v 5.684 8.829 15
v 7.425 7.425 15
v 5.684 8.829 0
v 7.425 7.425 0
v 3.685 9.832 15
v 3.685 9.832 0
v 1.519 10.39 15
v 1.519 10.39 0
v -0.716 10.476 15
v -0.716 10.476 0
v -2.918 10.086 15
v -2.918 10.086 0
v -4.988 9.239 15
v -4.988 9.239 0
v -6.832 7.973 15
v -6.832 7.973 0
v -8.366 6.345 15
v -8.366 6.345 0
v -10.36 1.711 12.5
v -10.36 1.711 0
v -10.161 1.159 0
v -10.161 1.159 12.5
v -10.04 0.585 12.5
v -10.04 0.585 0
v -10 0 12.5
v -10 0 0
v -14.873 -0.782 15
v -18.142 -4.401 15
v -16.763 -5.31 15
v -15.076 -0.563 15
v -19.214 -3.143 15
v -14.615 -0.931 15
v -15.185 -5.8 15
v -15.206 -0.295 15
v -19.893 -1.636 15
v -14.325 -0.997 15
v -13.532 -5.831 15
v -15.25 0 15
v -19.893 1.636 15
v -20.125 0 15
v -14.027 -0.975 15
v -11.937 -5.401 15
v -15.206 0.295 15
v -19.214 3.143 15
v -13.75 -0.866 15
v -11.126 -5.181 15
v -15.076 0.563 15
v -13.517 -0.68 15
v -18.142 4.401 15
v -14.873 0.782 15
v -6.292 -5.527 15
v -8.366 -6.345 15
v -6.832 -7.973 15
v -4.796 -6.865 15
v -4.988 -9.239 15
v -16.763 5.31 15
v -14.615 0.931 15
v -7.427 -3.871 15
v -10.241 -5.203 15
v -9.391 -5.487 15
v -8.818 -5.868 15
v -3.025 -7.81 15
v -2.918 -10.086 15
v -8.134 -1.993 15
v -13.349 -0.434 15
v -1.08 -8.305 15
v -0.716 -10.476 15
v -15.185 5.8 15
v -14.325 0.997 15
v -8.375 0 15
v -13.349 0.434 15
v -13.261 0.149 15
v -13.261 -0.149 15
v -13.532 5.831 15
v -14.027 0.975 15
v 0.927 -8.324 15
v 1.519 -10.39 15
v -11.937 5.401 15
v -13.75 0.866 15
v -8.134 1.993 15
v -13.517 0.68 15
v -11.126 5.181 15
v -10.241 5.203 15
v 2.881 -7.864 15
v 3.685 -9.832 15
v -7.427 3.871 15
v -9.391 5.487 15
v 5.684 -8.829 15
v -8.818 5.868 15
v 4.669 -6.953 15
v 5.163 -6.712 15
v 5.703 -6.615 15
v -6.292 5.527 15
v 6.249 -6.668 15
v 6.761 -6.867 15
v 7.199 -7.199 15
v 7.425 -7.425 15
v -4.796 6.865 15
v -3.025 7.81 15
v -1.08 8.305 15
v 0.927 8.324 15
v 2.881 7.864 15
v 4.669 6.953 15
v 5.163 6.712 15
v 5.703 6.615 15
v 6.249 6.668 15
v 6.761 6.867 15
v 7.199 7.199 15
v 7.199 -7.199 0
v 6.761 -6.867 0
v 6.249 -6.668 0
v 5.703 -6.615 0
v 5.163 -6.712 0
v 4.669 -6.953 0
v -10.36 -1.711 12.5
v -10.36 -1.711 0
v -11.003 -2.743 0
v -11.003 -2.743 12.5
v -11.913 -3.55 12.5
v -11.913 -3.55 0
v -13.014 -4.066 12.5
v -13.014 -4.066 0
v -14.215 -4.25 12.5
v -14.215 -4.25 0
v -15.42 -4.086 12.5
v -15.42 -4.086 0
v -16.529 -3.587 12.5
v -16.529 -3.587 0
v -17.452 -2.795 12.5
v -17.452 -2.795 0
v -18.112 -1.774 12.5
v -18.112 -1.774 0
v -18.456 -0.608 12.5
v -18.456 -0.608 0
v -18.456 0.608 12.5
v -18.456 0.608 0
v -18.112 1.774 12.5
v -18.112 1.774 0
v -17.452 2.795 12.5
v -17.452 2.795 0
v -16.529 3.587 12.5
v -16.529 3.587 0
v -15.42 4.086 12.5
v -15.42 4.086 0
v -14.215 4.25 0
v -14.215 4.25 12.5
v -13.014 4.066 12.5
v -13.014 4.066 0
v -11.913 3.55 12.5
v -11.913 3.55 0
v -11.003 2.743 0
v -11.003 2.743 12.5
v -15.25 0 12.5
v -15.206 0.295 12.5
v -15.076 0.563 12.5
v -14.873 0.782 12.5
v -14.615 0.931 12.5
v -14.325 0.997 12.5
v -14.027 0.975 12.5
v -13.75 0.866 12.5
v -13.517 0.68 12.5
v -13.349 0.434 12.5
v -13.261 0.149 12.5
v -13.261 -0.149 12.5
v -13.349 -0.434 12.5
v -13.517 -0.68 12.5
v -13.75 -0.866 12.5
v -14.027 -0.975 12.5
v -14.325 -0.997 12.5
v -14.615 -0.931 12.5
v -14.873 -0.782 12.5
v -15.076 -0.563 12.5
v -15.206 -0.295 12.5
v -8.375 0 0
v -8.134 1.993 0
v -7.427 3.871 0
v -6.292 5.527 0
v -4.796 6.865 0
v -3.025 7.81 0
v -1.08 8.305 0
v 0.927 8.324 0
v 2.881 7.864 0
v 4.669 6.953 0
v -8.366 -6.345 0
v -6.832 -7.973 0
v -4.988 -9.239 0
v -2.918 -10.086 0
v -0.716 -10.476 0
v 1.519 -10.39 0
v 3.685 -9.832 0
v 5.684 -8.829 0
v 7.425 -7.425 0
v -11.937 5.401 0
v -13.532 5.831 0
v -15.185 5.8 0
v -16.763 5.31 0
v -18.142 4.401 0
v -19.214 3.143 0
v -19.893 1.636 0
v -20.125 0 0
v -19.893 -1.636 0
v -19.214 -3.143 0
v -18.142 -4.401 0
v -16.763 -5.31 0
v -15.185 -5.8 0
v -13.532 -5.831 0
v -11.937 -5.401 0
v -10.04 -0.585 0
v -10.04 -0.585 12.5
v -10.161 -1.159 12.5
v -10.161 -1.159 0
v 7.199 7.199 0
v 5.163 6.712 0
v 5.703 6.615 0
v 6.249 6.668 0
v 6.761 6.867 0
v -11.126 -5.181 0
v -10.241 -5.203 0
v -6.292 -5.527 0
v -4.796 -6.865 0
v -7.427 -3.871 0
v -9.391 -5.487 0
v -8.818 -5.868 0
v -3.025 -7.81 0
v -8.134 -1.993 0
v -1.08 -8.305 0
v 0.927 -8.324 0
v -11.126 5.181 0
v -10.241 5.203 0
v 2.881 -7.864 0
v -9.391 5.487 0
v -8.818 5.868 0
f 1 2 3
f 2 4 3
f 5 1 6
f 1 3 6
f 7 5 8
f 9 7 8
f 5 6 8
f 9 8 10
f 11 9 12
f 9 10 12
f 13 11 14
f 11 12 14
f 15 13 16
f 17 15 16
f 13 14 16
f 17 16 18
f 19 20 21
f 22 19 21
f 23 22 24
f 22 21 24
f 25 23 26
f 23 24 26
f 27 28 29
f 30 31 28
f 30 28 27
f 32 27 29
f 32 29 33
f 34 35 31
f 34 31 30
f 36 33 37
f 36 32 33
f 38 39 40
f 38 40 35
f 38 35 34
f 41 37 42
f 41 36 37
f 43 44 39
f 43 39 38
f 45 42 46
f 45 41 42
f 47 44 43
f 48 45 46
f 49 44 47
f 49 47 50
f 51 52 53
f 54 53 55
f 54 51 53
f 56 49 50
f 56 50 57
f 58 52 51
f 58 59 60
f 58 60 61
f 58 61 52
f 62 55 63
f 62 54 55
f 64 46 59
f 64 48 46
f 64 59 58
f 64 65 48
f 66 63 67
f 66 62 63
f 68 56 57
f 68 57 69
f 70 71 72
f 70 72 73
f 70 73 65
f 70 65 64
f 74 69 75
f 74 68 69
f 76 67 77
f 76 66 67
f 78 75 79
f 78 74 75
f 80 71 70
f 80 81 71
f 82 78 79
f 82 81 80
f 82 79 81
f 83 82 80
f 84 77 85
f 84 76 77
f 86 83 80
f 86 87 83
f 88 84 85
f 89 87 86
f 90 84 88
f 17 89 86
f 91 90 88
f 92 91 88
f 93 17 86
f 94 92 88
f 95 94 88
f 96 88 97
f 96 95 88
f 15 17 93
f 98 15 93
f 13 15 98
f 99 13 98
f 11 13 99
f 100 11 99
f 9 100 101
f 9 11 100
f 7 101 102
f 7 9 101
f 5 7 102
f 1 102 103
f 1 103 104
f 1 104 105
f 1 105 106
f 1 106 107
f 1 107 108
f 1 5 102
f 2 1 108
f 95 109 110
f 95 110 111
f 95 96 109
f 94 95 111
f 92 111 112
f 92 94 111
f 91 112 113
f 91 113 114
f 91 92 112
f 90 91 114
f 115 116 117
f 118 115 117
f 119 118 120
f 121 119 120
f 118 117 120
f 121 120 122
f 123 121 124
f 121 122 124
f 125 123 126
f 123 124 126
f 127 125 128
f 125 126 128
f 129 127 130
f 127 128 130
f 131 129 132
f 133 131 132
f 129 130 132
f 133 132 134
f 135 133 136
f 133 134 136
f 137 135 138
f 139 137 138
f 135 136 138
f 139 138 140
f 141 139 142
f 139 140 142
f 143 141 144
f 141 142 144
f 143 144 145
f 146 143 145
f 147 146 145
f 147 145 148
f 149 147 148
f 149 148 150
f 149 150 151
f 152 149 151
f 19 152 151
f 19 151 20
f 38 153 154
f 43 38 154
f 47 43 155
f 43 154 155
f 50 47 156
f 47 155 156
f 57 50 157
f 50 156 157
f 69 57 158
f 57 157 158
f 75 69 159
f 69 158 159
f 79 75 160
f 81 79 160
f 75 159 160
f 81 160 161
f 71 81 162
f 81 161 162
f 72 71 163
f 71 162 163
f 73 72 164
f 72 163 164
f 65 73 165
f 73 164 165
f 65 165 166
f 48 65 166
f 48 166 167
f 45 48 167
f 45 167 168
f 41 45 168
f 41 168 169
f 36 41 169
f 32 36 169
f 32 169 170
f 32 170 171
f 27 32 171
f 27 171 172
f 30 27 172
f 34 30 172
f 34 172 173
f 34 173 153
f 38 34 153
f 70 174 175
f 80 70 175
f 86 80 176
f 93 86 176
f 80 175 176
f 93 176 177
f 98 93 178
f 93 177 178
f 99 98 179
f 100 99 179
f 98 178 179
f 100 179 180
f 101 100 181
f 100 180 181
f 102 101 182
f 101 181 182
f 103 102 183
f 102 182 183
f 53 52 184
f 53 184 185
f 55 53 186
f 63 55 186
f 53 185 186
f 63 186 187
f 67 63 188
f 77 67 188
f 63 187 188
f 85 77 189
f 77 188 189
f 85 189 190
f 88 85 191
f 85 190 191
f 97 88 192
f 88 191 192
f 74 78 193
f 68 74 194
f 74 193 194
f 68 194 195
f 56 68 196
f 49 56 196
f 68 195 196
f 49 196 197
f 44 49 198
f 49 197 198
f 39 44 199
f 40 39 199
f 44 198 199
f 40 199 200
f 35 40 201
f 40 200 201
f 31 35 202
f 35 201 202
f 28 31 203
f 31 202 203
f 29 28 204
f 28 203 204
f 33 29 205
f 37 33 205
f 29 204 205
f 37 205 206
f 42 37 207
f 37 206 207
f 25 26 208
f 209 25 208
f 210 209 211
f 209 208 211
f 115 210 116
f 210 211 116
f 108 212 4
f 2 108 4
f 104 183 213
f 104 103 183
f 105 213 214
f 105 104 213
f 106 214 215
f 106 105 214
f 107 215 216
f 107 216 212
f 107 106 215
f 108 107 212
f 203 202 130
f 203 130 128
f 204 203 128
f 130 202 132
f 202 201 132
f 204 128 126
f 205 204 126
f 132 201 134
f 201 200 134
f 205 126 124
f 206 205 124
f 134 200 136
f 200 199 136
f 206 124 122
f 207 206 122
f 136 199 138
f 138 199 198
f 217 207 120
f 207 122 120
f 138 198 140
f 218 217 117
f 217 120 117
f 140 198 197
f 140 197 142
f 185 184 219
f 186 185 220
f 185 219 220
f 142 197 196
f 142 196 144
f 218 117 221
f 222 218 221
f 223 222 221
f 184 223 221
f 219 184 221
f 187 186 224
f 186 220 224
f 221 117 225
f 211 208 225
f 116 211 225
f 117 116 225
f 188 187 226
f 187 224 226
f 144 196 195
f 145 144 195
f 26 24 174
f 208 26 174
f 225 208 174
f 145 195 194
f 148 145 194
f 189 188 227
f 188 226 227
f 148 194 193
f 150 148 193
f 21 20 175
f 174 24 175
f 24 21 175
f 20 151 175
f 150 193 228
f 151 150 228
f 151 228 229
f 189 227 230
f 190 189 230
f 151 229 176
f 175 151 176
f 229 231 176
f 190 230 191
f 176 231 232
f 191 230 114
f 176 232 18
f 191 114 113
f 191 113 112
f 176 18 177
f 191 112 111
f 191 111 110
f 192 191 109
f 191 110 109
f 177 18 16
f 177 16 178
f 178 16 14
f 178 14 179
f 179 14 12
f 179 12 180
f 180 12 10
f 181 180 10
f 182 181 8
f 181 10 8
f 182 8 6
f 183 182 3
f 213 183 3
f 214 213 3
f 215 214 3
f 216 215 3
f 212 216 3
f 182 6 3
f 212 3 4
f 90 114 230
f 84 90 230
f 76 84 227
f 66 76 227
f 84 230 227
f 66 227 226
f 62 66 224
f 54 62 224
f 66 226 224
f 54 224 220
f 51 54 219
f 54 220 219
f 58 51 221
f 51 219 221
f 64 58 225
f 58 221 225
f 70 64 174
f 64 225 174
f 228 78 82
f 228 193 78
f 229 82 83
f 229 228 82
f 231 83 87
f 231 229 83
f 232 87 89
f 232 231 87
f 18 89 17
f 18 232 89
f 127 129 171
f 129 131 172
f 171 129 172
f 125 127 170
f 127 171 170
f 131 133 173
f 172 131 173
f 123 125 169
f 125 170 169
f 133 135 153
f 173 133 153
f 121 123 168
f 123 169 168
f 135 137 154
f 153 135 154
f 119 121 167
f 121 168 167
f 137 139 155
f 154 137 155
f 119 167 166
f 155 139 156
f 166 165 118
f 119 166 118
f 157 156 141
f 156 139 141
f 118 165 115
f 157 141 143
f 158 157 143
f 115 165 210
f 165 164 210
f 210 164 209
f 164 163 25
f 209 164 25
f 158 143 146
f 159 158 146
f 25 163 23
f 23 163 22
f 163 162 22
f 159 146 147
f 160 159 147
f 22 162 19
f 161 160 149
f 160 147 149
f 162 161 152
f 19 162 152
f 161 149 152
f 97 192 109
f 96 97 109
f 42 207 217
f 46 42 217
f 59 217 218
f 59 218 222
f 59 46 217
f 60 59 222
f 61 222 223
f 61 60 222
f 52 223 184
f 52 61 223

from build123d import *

# Parameters (mm, degrees)
F1_DEPTH = 15
F2_R     = 2
F3_R     = 5.875
F4_DEPTH = 2.5
F5_R     = 3
F7_D     = 2


with BuildPart() as f1:
    # F0 (on Top) → F1 (new body)
    with BuildSketch(Plane.XY):
        with BuildLine():
            ThreePointArc((-10.3596491228, 1.7110435565), (-10.0908840346, 0.8742164411), (-10, 0))
            ThreePointArc((-10, 0), (-10.0908840346, -0.8742164411), (-10.3596491228, -1.7110435565))
            ThreePointArc((-10.3596491228, -1.7110435565), (-10.1258015969, -2.778154427), (-9.7823464912, -3.8151929343))
            ThreePointArc((-9.7823464912, -3.8151929343), (-8.7380543651, -2.0332437921), (-8.375, 0))
            ThreePointArc((-8.375, 0), (-8.7380543651, 2.0332437921), (-9.7823464912, 3.8151929343))
            ThreePointArc((-9.7823464912, 3.8151929343), (-10.1258015969, 2.778154427), (-10.3596491228, 1.7110435565))
        make_face()
        with BuildLine():
            ThreePointArc((-10.3596491228, -1.7110435565), (-18.5, 0), (-10.3596491228, 1.7110435565))
            ThreePointArc((-10.3596491228, 1.7110435565), (-10.1258015969, 2.778154427), (-9.7823464912, 3.8151929343))
            ThreePointArc((-9.7823464912, 3.8151929343), (-20.125, 0), (-9.7823464912, -3.8151929343))
            ThreePointArc((-9.7823464912, -3.8151929343), (-10.1258015969, -2.778154427), (-10.3596491228, -1.7110435565))
        make_face()
        with BuildLine():
            ThreePointArc((7.4246212025, 7.4246212025), (-2.1556229355, 10.2763461288), (-9.7823464912, 3.8151929343))
            ThreePointArc((-9.7823464912, 3.8151929343), (-8.7380543651, 2.0332437921), (-8.375, 0))
            ThreePointArc((-8.375, 0), (-3.2049737461, 7.7374910848), (5.9220192924, 5.9220192924))
            Line((5.9220192924, 5.9220192924), (7.4246212025, 7.4246212025))
        make_face()
        with BuildLine():
            ThreePointArc((-8.375, 0), (-8.7380543651, -2.0332437921), (-9.7823464912, -3.8151929343))
            ThreePointArc((-9.7823464912, -3.8151929343), (-2.1556229355, -10.2763461288), (7.4246212025, -7.4246212025))
            Line((7.4246212025, -7.4246212025), (5.9220192924, -5.9220192924))
            ThreePointArc((5.9220192924, -5.9220192924), (-3.2049737461, -7.7374910848), (-8.375, 0))
        make_face()
    extrude(amount=F1_DEPTH)

    # F2
    f2_edges = [f1.edges().sort_by_distance(p)[0] for p in [
        (5.922019, 5.922019, 7.5),
        (5.922019, -5.922019, 7.5),
    ]]
    fillet(f2_edges, radius=F2_R)

    # F3 (on face) → F4 (join)
    with BuildSketch(Plane.XY.offset(15)):
        with Locations((-14.25, 0)):
            Circle(F3_R)
    extrude(amount=-F4_DEPTH)

    # F5
    f5_edges = [f1.edges().sort_by_distance(p)[0] for p in [
        (-9.782346, 3.815193, 7.5),
        (-9.782346, -3.815193, 7.5),
    ]]
    fillet(f5_edges, radius=F5_R)

    # F7 (through all)
    with Locations(Plane.XY.offset(15)):
        with Locations((-14.25, 0)):
            Hole(F7_D / 2)


solid = f1.part
